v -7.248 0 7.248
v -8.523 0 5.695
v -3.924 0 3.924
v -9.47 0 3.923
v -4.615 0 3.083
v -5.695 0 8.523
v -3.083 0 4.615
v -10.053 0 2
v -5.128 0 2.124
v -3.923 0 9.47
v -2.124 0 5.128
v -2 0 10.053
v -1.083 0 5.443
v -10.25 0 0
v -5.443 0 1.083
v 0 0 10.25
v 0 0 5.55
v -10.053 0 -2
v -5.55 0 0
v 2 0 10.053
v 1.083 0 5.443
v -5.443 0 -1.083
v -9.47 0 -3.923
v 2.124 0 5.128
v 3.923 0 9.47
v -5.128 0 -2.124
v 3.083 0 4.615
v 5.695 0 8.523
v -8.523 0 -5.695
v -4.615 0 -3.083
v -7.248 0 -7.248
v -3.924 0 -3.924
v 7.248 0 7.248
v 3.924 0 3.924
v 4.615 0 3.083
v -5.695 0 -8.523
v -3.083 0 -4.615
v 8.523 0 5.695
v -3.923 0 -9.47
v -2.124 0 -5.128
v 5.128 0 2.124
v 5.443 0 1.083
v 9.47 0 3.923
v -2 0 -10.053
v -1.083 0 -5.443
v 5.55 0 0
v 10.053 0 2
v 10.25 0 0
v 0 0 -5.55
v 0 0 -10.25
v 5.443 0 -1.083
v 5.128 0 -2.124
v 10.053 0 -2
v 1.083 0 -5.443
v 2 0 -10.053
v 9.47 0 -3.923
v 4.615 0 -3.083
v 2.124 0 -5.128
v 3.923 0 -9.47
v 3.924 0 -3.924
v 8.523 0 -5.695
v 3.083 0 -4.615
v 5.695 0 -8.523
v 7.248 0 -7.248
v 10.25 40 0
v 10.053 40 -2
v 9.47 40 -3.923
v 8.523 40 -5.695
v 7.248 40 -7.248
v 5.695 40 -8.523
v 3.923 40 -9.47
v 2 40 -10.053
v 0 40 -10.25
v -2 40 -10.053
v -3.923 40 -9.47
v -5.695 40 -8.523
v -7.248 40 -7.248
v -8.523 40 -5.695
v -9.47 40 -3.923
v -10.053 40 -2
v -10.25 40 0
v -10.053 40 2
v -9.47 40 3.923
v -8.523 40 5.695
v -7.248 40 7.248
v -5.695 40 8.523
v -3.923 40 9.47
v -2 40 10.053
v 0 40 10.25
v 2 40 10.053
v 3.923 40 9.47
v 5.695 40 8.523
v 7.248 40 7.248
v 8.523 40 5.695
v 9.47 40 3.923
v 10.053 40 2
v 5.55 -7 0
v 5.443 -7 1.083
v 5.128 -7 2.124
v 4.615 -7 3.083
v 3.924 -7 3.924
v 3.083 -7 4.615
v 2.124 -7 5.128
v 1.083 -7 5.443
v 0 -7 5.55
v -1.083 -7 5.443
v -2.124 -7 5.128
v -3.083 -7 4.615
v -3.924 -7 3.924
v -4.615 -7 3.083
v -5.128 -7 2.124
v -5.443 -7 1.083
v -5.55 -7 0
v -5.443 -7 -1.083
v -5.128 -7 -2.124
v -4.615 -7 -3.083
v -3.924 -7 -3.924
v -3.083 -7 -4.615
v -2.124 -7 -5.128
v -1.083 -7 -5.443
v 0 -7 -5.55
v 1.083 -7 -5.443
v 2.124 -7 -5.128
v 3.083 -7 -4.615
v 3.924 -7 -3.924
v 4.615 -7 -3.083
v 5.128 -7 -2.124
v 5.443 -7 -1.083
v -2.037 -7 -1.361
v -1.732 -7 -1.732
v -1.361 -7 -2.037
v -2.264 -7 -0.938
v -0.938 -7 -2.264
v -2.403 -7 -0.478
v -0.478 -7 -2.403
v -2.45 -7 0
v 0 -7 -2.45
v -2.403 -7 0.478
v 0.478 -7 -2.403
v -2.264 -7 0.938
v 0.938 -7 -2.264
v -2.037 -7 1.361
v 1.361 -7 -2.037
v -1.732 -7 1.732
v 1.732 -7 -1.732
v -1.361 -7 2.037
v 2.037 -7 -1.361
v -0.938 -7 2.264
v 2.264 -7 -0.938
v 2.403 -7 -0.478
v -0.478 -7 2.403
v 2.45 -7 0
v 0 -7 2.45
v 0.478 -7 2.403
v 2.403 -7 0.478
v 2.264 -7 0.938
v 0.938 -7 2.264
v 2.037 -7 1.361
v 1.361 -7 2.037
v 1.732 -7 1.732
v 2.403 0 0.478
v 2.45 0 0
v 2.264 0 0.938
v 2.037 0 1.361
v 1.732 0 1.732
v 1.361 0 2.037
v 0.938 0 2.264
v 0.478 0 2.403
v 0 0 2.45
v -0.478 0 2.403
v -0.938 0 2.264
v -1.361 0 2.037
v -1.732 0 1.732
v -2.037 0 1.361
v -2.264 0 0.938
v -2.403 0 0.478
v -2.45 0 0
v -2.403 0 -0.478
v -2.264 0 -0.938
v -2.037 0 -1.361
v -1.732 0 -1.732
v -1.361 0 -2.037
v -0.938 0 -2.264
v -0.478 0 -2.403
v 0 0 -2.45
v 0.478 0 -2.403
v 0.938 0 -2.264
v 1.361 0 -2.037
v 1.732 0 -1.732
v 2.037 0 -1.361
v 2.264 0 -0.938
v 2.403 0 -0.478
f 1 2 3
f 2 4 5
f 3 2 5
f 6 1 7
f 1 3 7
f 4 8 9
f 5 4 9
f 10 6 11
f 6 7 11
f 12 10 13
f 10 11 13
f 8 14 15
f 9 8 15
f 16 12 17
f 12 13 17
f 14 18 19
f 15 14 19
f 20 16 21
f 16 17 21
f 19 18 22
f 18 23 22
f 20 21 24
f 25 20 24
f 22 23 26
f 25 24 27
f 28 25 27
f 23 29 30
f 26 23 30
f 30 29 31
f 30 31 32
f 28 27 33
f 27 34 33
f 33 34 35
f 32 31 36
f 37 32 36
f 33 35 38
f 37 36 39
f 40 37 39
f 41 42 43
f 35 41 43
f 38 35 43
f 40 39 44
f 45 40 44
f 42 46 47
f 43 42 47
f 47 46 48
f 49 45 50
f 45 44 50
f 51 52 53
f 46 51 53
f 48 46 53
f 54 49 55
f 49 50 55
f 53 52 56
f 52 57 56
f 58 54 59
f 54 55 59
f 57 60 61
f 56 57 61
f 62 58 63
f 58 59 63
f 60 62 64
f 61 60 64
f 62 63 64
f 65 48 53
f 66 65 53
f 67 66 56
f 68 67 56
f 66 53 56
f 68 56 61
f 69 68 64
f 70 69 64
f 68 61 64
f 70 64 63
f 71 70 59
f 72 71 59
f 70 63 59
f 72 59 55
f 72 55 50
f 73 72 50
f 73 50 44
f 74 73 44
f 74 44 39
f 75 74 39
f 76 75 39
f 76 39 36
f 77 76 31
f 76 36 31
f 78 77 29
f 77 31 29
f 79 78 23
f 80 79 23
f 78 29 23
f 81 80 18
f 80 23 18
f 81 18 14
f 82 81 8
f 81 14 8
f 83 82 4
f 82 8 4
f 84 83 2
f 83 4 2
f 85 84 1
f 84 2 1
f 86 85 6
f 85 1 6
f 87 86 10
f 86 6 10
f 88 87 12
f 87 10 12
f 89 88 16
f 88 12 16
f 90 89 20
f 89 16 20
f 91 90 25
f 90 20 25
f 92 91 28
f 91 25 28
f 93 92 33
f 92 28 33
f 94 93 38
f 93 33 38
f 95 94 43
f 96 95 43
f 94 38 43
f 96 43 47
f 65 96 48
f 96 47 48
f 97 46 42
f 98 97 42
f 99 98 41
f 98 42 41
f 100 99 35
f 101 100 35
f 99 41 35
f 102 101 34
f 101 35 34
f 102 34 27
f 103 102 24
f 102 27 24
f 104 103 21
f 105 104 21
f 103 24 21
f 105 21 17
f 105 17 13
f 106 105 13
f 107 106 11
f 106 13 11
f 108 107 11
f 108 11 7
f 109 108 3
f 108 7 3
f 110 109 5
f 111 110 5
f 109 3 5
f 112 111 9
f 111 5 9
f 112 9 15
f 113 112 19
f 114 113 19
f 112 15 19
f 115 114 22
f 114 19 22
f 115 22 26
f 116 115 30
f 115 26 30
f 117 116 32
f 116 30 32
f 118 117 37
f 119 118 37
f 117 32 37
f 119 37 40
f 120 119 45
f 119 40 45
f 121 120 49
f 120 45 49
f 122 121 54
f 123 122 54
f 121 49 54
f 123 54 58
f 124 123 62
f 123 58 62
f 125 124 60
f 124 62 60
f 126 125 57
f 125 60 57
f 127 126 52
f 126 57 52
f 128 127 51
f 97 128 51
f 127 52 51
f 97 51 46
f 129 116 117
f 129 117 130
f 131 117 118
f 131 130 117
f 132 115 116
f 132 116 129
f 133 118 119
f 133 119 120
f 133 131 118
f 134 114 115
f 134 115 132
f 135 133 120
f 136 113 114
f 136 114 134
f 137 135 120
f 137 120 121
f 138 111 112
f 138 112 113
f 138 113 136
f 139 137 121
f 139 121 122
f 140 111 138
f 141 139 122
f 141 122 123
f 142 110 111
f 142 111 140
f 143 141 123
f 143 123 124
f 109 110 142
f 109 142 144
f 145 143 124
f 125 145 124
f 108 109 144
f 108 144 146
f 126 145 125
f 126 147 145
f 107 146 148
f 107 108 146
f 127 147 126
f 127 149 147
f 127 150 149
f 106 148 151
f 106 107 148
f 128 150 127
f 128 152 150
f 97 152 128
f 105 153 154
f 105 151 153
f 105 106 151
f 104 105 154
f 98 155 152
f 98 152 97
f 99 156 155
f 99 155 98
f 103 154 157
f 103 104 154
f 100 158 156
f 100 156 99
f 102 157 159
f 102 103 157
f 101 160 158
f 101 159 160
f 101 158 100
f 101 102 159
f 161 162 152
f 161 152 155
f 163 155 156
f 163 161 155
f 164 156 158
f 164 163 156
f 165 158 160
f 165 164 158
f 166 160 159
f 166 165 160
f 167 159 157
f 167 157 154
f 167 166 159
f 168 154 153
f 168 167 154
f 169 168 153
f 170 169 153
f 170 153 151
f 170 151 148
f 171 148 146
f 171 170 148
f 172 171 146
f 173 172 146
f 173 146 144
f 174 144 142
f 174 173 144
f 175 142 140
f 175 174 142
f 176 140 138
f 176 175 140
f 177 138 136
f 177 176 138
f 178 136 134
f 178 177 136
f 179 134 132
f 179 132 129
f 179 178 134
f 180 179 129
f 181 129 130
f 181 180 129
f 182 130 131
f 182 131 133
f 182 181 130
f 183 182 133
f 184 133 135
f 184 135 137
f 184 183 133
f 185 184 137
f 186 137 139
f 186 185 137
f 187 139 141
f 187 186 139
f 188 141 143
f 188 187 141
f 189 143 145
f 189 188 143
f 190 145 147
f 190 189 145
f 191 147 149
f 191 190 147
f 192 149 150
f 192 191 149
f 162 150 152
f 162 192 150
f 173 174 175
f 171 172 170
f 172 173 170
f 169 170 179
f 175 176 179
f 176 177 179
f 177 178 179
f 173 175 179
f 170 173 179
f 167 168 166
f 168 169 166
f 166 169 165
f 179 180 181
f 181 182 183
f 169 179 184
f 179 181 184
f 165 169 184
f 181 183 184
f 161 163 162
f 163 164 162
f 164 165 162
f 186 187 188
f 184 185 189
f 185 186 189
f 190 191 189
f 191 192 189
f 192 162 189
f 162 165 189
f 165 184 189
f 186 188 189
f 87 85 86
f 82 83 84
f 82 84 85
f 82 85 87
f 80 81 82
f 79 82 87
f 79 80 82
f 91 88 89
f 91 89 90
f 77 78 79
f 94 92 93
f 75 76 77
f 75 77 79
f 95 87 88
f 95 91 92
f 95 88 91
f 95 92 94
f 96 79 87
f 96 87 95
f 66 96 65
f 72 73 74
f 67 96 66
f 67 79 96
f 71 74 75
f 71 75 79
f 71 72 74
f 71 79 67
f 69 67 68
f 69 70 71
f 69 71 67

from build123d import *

# Parameters (mm, degrees)
CROQUIS1_R              = 10.25
SALIENTE_EXTRUIR1_DEPTH = 40
CROQUIS2_R              = 5.55
CROQUIS2_R_2            = 2.45
SALIENTE_EXTRUIR2_DEPTH = 7


with BuildPart() as part:
    # Croquis1 → Saliente-Extruir1 (new body)
    with BuildSketch(Plane(origin=(0, 0, 0), x_dir=(1, 0, 0), z_dir=(0, 1, 0))):
        Circle(CROQUIS1_R)
    extrude(amount=SALIENTE_EXTRUIR1_DEPTH)

    # Croquis2 → Saliente-Extruir2 (add)
    with BuildSketch(Plane.XZ):
        Circle(CROQUIS2_R)
        Circle(CROQUIS2_R_2, mode=Mode.SUBTRACT)
    extrude(amount=SALIENTE_EXTRUIR2_DEPTH)


solid = part.part
